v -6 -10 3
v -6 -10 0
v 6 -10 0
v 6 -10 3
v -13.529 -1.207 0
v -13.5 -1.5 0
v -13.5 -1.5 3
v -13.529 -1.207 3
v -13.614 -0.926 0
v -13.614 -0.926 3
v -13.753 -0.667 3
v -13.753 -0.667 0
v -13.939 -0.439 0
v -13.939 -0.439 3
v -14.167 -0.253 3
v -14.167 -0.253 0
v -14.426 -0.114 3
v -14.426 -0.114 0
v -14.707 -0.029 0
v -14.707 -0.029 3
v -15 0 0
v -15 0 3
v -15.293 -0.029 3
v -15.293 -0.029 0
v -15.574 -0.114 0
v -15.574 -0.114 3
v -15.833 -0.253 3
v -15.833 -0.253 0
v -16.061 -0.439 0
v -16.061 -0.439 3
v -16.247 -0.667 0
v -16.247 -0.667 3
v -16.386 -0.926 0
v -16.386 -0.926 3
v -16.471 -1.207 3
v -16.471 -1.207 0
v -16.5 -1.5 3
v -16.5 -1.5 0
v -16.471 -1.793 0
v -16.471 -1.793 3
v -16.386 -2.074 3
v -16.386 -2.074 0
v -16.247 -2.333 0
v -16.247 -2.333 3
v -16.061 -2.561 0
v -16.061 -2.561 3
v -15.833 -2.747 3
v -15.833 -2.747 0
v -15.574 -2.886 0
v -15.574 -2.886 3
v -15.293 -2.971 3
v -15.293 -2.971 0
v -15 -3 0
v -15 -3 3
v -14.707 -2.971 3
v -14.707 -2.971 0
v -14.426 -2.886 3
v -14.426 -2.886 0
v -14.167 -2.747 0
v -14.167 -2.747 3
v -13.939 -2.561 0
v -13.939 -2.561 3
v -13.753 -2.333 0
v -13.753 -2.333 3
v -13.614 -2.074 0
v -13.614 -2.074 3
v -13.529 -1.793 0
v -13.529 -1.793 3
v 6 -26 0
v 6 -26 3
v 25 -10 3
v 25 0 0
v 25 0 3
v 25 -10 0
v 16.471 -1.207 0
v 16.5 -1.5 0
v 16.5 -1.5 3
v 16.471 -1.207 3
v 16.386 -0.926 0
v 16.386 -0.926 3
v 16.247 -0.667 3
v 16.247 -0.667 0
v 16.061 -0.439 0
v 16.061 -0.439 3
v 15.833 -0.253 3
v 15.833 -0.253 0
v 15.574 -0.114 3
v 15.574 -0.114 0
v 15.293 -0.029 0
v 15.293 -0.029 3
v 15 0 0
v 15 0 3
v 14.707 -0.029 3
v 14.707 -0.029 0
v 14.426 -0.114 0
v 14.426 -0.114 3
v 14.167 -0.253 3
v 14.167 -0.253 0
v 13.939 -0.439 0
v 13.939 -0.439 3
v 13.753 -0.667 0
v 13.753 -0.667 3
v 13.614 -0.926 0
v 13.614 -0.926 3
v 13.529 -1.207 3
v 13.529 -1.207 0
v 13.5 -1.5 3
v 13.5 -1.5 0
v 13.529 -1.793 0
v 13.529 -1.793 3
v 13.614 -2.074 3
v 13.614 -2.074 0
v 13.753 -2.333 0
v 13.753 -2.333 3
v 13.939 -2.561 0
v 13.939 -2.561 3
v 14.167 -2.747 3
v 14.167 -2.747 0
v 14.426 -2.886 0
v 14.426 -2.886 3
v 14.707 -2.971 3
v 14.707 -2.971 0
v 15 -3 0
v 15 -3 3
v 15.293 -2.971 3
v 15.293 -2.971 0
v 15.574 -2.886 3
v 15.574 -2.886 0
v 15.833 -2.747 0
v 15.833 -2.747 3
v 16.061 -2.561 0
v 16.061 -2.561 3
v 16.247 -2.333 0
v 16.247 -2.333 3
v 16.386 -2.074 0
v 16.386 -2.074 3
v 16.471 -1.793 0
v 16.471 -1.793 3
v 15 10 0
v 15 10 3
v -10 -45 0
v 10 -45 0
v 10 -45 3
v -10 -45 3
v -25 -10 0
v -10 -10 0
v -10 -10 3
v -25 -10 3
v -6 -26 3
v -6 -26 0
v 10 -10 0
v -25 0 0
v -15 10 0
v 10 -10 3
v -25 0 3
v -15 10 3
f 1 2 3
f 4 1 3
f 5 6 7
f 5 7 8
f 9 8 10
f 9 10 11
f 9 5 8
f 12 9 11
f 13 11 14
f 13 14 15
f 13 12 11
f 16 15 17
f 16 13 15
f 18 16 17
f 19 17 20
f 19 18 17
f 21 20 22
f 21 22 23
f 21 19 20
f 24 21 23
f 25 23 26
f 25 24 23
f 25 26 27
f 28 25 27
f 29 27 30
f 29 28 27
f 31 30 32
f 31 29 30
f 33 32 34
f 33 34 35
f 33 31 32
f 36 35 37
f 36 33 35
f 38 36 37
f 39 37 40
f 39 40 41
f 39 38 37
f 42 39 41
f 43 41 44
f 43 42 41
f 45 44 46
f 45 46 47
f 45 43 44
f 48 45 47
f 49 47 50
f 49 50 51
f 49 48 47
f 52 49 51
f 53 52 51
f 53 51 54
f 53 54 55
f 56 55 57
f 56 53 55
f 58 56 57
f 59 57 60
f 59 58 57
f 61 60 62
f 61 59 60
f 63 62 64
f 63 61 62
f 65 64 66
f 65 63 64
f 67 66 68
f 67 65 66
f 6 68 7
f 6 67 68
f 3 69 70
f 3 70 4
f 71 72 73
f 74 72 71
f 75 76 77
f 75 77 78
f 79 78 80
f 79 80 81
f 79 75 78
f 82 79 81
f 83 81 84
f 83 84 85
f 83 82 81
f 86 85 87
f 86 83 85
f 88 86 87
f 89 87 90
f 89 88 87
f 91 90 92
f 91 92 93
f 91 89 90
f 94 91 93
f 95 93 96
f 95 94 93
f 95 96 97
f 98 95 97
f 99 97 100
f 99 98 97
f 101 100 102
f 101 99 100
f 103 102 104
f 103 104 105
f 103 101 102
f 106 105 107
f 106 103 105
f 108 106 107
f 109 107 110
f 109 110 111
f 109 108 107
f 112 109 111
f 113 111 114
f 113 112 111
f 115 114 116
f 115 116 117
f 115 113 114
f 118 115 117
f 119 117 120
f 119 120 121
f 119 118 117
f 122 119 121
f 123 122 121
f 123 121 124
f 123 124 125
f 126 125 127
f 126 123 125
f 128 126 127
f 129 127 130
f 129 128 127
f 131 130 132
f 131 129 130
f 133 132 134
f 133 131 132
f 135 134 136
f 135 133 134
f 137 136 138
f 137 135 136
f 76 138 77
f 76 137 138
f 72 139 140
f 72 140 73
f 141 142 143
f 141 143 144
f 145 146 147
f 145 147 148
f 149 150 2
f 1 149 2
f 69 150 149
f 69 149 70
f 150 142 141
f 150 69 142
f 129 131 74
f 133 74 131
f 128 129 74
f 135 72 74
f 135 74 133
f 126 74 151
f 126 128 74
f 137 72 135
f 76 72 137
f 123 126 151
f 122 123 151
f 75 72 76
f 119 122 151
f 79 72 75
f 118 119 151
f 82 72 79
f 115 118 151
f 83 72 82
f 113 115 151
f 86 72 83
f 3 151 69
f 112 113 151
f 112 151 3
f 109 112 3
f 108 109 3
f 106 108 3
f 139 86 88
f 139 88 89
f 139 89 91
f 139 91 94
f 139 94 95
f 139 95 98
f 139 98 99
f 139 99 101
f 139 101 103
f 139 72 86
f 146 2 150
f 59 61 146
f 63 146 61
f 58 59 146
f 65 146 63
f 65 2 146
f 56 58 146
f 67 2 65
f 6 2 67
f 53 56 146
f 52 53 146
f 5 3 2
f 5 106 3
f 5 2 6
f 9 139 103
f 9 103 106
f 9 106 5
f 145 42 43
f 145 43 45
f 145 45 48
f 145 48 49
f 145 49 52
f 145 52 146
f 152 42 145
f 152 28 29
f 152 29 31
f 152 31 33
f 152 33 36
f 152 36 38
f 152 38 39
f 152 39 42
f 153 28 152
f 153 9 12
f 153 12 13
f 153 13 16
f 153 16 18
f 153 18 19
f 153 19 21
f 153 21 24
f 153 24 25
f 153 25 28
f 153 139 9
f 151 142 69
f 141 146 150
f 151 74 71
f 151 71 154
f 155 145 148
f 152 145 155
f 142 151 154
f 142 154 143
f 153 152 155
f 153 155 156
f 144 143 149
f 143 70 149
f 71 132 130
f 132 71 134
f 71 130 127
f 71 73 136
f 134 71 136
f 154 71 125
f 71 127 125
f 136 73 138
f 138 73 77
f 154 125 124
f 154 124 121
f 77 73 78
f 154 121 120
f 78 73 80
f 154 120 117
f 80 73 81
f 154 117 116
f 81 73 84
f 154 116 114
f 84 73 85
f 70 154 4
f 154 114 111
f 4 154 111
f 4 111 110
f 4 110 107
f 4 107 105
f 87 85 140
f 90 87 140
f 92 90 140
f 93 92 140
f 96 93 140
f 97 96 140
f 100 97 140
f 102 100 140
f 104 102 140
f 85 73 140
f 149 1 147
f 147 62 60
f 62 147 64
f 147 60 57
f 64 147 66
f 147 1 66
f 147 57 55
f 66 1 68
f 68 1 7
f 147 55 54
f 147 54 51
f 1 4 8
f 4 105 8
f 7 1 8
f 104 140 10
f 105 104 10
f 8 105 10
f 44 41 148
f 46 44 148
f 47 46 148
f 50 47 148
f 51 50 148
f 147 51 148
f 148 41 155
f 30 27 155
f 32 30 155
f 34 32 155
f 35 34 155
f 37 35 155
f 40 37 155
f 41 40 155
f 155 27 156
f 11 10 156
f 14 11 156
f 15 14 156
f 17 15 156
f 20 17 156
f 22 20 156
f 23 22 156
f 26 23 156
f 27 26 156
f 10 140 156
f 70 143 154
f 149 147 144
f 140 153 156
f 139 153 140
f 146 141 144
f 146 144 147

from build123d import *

# Parameters (mm, degrees)
CROQUIS1_R              = 1.5
CROQUIS1_W              = 12
CROQUIS1_H              = 16
SALIENTE_EXTRUIR1_DEPTH = 3


with BuildPart() as part:
    # Croquis1 → Saliente-Extruir1 (new body)
    with BuildSketch(Plane.XY):
        Polygon((-25, 0), (-15, 10), (15, 10), (25, 0), (25, -10), (10, -10), (10, -45), (-10, -45), (-10, -10), (-25, -10), align=None)
        with Locations((-15, -1.5)):
            Circle(CROQUIS1_R, mode=Mode.SUBTRACT)
        with Locations((15, -1.5)):
            Circle(CROQUIS1_R, mode=Mode.SUBTRACT)
        with Locations((0, -18)):
            Rectangle(CROQUIS1_W, CROQUIS1_H, mode=Mode.SUBTRACT)
    extrude(amount=SALIENTE_EXTRUIR1_DEPTH)


solid = part.part
